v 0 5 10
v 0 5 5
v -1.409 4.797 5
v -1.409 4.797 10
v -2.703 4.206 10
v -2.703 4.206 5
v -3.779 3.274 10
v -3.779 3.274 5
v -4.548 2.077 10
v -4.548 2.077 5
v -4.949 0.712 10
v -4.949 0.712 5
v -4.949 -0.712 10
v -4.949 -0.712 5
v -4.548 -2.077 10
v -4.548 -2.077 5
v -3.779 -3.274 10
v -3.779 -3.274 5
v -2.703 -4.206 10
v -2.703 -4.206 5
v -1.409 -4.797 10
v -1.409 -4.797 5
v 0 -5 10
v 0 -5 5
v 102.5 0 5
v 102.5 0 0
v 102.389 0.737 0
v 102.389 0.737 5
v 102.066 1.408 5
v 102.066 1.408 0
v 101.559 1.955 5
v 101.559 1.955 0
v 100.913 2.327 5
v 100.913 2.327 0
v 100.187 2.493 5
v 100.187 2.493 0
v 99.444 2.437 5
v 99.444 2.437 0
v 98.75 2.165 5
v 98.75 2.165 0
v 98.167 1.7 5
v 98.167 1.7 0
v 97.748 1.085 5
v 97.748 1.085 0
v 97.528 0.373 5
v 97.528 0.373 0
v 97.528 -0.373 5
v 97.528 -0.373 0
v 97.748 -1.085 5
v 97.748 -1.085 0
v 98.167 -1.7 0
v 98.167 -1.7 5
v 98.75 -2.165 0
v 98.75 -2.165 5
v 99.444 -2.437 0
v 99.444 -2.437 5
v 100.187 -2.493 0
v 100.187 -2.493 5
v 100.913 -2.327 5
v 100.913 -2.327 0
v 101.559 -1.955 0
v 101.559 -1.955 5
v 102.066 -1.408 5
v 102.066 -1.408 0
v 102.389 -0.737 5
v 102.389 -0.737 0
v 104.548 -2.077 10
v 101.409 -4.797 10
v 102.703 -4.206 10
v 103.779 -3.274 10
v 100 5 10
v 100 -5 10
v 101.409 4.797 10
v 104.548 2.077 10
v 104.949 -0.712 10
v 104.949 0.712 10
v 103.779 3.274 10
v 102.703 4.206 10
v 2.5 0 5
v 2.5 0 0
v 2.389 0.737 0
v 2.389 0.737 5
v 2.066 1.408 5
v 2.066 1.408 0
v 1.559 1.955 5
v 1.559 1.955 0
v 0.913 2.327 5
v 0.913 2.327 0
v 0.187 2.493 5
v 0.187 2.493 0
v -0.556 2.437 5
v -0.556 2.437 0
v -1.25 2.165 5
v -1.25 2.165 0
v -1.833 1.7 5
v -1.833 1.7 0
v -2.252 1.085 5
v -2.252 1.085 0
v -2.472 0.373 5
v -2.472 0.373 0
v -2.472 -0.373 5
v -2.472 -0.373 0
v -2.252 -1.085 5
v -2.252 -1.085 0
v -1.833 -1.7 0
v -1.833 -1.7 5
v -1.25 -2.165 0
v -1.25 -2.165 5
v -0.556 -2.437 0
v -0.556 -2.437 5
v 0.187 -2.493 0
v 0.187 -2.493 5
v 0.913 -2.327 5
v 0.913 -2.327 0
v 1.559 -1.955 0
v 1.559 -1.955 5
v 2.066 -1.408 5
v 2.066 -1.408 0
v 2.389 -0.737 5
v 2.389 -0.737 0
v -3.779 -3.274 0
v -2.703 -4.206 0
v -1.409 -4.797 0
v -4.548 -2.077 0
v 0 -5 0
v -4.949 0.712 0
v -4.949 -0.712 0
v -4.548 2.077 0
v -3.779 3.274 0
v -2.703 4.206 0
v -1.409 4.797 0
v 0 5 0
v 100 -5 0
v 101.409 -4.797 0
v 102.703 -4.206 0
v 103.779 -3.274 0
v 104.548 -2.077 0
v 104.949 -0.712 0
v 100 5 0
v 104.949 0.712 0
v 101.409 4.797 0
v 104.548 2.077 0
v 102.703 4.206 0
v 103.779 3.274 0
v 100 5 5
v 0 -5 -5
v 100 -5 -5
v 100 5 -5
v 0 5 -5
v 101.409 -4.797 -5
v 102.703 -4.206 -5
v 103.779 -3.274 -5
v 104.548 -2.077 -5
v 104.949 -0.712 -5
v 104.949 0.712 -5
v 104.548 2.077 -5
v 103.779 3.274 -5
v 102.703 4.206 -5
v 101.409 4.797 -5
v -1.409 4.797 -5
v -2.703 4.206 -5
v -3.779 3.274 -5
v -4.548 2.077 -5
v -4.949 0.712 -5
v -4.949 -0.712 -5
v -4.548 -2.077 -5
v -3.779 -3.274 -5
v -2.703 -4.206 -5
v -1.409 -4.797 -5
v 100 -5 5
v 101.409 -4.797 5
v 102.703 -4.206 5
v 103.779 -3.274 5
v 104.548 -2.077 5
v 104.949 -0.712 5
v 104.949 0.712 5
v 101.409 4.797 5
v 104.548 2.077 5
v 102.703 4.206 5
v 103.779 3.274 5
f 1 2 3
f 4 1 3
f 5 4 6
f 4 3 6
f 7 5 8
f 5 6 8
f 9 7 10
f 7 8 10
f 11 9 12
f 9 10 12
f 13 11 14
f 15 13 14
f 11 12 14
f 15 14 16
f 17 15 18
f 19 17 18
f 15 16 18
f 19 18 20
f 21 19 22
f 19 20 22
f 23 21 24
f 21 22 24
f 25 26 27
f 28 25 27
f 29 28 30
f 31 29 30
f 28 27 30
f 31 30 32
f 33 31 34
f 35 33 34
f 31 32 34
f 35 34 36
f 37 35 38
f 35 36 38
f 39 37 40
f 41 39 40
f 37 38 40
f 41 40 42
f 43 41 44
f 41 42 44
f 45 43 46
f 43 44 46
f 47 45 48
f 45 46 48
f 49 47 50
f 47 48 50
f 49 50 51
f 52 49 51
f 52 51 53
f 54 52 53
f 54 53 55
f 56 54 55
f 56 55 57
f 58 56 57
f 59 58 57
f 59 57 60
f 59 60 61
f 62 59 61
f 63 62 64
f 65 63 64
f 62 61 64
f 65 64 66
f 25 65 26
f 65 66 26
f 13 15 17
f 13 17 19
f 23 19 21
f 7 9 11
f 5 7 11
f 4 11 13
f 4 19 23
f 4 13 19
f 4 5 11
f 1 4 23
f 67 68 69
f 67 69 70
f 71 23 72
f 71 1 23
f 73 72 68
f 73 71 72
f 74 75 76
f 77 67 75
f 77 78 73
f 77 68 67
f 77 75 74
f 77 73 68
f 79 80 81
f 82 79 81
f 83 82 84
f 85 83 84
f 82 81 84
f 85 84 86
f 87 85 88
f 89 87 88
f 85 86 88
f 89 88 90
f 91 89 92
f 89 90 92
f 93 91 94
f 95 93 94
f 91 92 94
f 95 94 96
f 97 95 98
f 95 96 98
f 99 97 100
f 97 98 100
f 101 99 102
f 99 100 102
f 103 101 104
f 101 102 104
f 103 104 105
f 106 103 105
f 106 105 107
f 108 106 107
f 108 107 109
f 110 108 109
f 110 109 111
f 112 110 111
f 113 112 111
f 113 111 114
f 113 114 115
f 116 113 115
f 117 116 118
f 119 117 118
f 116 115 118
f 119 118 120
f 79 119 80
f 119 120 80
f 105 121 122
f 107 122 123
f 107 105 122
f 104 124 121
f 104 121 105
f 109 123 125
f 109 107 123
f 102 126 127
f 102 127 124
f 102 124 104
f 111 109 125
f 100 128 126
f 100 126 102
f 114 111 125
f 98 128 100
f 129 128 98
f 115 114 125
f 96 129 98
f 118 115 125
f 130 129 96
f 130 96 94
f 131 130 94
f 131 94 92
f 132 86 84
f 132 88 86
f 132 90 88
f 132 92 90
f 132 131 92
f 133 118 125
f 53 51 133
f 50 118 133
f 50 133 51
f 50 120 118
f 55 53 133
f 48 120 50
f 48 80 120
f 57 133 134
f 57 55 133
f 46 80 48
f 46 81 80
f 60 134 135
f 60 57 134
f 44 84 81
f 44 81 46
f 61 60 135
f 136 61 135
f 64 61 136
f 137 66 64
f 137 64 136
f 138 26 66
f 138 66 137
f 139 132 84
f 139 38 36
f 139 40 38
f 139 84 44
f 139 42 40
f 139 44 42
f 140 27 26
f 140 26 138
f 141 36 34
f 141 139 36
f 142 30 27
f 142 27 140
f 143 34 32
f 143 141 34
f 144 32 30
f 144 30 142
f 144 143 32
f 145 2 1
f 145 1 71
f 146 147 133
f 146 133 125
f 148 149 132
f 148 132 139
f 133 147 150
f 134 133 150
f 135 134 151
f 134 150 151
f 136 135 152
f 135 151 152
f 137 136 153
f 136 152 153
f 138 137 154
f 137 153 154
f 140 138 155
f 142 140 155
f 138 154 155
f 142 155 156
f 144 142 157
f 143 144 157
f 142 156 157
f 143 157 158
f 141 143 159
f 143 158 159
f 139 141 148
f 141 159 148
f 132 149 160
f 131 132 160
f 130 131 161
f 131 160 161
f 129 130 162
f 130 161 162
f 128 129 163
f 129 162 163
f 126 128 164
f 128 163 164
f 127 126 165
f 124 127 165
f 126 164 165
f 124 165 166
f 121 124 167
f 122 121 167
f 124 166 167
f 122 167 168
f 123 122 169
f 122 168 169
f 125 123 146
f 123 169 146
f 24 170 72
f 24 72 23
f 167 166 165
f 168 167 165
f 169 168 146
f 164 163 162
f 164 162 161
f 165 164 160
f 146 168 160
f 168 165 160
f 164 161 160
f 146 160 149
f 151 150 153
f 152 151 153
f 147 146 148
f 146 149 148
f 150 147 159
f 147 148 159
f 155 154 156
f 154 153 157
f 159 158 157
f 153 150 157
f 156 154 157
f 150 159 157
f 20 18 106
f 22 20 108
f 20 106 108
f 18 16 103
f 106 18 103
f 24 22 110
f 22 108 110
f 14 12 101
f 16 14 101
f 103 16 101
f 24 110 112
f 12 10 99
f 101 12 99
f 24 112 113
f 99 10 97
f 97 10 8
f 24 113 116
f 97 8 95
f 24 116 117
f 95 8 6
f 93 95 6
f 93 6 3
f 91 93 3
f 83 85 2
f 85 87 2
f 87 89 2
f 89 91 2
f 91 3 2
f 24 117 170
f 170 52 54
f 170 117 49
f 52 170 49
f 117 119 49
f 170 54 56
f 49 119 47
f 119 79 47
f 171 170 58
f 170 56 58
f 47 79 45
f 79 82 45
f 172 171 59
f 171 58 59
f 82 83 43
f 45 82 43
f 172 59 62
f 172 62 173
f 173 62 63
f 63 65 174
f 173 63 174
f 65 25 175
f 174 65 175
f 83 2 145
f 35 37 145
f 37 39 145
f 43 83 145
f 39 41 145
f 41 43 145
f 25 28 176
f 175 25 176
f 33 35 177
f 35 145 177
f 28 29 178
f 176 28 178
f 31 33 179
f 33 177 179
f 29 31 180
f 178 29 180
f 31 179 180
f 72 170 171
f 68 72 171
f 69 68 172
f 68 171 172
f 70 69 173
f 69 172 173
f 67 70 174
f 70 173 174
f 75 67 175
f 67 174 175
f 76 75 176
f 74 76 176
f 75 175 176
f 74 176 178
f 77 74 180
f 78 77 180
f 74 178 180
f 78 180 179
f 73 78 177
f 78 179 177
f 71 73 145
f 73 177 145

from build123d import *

# Parameters (mm, degrees)
EXTRUDE001_DEPTH = 5
ARRAY_Z_COUNT    = 2
ARRAY_Z_PITCH    = 10
SKETCH002_R      = 2.5
EXTRUDE002_DEPTH = 5


with BuildPart() as array:
    # Sketch001 → Extrude001 (new body)
    with BuildSketch(Plane.XY.offset(-5)):
        with BuildLine():
            ThreePointArc((100, -5), (105, 0), (100, 5))
            Line((0, 5), (100, 5))
            ThreePointArc((0, 5), (-5, 0), (0, -5))
            Line((100, -5), (0, -5))
        make_face()
    extrude(amount=EXTRUDE001_DEPTH)

    # Array Z: Array ×2


with BuildPart() as array_1:
    add(array.part)
    with Locations(*[(0, 0, i * ARRAY_Z_PITCH) for i in range(1, ARRAY_Z_COUNT)]):
        add(array.part)


with BuildPart() as fusion:
    # Sketch002 (on Face6 of Array) → Extrude002 (new body)
    with BuildSketch(Plane.XY):
        Circle(SKETCH002_R)
        with Locations((100, 0)):
            Circle(SKETCH002_R)
    extrude(amount=EXTRUDE002_DEPTH)

    # Fusion: union Array
    add(array_1.part)


solid = fusion.part
